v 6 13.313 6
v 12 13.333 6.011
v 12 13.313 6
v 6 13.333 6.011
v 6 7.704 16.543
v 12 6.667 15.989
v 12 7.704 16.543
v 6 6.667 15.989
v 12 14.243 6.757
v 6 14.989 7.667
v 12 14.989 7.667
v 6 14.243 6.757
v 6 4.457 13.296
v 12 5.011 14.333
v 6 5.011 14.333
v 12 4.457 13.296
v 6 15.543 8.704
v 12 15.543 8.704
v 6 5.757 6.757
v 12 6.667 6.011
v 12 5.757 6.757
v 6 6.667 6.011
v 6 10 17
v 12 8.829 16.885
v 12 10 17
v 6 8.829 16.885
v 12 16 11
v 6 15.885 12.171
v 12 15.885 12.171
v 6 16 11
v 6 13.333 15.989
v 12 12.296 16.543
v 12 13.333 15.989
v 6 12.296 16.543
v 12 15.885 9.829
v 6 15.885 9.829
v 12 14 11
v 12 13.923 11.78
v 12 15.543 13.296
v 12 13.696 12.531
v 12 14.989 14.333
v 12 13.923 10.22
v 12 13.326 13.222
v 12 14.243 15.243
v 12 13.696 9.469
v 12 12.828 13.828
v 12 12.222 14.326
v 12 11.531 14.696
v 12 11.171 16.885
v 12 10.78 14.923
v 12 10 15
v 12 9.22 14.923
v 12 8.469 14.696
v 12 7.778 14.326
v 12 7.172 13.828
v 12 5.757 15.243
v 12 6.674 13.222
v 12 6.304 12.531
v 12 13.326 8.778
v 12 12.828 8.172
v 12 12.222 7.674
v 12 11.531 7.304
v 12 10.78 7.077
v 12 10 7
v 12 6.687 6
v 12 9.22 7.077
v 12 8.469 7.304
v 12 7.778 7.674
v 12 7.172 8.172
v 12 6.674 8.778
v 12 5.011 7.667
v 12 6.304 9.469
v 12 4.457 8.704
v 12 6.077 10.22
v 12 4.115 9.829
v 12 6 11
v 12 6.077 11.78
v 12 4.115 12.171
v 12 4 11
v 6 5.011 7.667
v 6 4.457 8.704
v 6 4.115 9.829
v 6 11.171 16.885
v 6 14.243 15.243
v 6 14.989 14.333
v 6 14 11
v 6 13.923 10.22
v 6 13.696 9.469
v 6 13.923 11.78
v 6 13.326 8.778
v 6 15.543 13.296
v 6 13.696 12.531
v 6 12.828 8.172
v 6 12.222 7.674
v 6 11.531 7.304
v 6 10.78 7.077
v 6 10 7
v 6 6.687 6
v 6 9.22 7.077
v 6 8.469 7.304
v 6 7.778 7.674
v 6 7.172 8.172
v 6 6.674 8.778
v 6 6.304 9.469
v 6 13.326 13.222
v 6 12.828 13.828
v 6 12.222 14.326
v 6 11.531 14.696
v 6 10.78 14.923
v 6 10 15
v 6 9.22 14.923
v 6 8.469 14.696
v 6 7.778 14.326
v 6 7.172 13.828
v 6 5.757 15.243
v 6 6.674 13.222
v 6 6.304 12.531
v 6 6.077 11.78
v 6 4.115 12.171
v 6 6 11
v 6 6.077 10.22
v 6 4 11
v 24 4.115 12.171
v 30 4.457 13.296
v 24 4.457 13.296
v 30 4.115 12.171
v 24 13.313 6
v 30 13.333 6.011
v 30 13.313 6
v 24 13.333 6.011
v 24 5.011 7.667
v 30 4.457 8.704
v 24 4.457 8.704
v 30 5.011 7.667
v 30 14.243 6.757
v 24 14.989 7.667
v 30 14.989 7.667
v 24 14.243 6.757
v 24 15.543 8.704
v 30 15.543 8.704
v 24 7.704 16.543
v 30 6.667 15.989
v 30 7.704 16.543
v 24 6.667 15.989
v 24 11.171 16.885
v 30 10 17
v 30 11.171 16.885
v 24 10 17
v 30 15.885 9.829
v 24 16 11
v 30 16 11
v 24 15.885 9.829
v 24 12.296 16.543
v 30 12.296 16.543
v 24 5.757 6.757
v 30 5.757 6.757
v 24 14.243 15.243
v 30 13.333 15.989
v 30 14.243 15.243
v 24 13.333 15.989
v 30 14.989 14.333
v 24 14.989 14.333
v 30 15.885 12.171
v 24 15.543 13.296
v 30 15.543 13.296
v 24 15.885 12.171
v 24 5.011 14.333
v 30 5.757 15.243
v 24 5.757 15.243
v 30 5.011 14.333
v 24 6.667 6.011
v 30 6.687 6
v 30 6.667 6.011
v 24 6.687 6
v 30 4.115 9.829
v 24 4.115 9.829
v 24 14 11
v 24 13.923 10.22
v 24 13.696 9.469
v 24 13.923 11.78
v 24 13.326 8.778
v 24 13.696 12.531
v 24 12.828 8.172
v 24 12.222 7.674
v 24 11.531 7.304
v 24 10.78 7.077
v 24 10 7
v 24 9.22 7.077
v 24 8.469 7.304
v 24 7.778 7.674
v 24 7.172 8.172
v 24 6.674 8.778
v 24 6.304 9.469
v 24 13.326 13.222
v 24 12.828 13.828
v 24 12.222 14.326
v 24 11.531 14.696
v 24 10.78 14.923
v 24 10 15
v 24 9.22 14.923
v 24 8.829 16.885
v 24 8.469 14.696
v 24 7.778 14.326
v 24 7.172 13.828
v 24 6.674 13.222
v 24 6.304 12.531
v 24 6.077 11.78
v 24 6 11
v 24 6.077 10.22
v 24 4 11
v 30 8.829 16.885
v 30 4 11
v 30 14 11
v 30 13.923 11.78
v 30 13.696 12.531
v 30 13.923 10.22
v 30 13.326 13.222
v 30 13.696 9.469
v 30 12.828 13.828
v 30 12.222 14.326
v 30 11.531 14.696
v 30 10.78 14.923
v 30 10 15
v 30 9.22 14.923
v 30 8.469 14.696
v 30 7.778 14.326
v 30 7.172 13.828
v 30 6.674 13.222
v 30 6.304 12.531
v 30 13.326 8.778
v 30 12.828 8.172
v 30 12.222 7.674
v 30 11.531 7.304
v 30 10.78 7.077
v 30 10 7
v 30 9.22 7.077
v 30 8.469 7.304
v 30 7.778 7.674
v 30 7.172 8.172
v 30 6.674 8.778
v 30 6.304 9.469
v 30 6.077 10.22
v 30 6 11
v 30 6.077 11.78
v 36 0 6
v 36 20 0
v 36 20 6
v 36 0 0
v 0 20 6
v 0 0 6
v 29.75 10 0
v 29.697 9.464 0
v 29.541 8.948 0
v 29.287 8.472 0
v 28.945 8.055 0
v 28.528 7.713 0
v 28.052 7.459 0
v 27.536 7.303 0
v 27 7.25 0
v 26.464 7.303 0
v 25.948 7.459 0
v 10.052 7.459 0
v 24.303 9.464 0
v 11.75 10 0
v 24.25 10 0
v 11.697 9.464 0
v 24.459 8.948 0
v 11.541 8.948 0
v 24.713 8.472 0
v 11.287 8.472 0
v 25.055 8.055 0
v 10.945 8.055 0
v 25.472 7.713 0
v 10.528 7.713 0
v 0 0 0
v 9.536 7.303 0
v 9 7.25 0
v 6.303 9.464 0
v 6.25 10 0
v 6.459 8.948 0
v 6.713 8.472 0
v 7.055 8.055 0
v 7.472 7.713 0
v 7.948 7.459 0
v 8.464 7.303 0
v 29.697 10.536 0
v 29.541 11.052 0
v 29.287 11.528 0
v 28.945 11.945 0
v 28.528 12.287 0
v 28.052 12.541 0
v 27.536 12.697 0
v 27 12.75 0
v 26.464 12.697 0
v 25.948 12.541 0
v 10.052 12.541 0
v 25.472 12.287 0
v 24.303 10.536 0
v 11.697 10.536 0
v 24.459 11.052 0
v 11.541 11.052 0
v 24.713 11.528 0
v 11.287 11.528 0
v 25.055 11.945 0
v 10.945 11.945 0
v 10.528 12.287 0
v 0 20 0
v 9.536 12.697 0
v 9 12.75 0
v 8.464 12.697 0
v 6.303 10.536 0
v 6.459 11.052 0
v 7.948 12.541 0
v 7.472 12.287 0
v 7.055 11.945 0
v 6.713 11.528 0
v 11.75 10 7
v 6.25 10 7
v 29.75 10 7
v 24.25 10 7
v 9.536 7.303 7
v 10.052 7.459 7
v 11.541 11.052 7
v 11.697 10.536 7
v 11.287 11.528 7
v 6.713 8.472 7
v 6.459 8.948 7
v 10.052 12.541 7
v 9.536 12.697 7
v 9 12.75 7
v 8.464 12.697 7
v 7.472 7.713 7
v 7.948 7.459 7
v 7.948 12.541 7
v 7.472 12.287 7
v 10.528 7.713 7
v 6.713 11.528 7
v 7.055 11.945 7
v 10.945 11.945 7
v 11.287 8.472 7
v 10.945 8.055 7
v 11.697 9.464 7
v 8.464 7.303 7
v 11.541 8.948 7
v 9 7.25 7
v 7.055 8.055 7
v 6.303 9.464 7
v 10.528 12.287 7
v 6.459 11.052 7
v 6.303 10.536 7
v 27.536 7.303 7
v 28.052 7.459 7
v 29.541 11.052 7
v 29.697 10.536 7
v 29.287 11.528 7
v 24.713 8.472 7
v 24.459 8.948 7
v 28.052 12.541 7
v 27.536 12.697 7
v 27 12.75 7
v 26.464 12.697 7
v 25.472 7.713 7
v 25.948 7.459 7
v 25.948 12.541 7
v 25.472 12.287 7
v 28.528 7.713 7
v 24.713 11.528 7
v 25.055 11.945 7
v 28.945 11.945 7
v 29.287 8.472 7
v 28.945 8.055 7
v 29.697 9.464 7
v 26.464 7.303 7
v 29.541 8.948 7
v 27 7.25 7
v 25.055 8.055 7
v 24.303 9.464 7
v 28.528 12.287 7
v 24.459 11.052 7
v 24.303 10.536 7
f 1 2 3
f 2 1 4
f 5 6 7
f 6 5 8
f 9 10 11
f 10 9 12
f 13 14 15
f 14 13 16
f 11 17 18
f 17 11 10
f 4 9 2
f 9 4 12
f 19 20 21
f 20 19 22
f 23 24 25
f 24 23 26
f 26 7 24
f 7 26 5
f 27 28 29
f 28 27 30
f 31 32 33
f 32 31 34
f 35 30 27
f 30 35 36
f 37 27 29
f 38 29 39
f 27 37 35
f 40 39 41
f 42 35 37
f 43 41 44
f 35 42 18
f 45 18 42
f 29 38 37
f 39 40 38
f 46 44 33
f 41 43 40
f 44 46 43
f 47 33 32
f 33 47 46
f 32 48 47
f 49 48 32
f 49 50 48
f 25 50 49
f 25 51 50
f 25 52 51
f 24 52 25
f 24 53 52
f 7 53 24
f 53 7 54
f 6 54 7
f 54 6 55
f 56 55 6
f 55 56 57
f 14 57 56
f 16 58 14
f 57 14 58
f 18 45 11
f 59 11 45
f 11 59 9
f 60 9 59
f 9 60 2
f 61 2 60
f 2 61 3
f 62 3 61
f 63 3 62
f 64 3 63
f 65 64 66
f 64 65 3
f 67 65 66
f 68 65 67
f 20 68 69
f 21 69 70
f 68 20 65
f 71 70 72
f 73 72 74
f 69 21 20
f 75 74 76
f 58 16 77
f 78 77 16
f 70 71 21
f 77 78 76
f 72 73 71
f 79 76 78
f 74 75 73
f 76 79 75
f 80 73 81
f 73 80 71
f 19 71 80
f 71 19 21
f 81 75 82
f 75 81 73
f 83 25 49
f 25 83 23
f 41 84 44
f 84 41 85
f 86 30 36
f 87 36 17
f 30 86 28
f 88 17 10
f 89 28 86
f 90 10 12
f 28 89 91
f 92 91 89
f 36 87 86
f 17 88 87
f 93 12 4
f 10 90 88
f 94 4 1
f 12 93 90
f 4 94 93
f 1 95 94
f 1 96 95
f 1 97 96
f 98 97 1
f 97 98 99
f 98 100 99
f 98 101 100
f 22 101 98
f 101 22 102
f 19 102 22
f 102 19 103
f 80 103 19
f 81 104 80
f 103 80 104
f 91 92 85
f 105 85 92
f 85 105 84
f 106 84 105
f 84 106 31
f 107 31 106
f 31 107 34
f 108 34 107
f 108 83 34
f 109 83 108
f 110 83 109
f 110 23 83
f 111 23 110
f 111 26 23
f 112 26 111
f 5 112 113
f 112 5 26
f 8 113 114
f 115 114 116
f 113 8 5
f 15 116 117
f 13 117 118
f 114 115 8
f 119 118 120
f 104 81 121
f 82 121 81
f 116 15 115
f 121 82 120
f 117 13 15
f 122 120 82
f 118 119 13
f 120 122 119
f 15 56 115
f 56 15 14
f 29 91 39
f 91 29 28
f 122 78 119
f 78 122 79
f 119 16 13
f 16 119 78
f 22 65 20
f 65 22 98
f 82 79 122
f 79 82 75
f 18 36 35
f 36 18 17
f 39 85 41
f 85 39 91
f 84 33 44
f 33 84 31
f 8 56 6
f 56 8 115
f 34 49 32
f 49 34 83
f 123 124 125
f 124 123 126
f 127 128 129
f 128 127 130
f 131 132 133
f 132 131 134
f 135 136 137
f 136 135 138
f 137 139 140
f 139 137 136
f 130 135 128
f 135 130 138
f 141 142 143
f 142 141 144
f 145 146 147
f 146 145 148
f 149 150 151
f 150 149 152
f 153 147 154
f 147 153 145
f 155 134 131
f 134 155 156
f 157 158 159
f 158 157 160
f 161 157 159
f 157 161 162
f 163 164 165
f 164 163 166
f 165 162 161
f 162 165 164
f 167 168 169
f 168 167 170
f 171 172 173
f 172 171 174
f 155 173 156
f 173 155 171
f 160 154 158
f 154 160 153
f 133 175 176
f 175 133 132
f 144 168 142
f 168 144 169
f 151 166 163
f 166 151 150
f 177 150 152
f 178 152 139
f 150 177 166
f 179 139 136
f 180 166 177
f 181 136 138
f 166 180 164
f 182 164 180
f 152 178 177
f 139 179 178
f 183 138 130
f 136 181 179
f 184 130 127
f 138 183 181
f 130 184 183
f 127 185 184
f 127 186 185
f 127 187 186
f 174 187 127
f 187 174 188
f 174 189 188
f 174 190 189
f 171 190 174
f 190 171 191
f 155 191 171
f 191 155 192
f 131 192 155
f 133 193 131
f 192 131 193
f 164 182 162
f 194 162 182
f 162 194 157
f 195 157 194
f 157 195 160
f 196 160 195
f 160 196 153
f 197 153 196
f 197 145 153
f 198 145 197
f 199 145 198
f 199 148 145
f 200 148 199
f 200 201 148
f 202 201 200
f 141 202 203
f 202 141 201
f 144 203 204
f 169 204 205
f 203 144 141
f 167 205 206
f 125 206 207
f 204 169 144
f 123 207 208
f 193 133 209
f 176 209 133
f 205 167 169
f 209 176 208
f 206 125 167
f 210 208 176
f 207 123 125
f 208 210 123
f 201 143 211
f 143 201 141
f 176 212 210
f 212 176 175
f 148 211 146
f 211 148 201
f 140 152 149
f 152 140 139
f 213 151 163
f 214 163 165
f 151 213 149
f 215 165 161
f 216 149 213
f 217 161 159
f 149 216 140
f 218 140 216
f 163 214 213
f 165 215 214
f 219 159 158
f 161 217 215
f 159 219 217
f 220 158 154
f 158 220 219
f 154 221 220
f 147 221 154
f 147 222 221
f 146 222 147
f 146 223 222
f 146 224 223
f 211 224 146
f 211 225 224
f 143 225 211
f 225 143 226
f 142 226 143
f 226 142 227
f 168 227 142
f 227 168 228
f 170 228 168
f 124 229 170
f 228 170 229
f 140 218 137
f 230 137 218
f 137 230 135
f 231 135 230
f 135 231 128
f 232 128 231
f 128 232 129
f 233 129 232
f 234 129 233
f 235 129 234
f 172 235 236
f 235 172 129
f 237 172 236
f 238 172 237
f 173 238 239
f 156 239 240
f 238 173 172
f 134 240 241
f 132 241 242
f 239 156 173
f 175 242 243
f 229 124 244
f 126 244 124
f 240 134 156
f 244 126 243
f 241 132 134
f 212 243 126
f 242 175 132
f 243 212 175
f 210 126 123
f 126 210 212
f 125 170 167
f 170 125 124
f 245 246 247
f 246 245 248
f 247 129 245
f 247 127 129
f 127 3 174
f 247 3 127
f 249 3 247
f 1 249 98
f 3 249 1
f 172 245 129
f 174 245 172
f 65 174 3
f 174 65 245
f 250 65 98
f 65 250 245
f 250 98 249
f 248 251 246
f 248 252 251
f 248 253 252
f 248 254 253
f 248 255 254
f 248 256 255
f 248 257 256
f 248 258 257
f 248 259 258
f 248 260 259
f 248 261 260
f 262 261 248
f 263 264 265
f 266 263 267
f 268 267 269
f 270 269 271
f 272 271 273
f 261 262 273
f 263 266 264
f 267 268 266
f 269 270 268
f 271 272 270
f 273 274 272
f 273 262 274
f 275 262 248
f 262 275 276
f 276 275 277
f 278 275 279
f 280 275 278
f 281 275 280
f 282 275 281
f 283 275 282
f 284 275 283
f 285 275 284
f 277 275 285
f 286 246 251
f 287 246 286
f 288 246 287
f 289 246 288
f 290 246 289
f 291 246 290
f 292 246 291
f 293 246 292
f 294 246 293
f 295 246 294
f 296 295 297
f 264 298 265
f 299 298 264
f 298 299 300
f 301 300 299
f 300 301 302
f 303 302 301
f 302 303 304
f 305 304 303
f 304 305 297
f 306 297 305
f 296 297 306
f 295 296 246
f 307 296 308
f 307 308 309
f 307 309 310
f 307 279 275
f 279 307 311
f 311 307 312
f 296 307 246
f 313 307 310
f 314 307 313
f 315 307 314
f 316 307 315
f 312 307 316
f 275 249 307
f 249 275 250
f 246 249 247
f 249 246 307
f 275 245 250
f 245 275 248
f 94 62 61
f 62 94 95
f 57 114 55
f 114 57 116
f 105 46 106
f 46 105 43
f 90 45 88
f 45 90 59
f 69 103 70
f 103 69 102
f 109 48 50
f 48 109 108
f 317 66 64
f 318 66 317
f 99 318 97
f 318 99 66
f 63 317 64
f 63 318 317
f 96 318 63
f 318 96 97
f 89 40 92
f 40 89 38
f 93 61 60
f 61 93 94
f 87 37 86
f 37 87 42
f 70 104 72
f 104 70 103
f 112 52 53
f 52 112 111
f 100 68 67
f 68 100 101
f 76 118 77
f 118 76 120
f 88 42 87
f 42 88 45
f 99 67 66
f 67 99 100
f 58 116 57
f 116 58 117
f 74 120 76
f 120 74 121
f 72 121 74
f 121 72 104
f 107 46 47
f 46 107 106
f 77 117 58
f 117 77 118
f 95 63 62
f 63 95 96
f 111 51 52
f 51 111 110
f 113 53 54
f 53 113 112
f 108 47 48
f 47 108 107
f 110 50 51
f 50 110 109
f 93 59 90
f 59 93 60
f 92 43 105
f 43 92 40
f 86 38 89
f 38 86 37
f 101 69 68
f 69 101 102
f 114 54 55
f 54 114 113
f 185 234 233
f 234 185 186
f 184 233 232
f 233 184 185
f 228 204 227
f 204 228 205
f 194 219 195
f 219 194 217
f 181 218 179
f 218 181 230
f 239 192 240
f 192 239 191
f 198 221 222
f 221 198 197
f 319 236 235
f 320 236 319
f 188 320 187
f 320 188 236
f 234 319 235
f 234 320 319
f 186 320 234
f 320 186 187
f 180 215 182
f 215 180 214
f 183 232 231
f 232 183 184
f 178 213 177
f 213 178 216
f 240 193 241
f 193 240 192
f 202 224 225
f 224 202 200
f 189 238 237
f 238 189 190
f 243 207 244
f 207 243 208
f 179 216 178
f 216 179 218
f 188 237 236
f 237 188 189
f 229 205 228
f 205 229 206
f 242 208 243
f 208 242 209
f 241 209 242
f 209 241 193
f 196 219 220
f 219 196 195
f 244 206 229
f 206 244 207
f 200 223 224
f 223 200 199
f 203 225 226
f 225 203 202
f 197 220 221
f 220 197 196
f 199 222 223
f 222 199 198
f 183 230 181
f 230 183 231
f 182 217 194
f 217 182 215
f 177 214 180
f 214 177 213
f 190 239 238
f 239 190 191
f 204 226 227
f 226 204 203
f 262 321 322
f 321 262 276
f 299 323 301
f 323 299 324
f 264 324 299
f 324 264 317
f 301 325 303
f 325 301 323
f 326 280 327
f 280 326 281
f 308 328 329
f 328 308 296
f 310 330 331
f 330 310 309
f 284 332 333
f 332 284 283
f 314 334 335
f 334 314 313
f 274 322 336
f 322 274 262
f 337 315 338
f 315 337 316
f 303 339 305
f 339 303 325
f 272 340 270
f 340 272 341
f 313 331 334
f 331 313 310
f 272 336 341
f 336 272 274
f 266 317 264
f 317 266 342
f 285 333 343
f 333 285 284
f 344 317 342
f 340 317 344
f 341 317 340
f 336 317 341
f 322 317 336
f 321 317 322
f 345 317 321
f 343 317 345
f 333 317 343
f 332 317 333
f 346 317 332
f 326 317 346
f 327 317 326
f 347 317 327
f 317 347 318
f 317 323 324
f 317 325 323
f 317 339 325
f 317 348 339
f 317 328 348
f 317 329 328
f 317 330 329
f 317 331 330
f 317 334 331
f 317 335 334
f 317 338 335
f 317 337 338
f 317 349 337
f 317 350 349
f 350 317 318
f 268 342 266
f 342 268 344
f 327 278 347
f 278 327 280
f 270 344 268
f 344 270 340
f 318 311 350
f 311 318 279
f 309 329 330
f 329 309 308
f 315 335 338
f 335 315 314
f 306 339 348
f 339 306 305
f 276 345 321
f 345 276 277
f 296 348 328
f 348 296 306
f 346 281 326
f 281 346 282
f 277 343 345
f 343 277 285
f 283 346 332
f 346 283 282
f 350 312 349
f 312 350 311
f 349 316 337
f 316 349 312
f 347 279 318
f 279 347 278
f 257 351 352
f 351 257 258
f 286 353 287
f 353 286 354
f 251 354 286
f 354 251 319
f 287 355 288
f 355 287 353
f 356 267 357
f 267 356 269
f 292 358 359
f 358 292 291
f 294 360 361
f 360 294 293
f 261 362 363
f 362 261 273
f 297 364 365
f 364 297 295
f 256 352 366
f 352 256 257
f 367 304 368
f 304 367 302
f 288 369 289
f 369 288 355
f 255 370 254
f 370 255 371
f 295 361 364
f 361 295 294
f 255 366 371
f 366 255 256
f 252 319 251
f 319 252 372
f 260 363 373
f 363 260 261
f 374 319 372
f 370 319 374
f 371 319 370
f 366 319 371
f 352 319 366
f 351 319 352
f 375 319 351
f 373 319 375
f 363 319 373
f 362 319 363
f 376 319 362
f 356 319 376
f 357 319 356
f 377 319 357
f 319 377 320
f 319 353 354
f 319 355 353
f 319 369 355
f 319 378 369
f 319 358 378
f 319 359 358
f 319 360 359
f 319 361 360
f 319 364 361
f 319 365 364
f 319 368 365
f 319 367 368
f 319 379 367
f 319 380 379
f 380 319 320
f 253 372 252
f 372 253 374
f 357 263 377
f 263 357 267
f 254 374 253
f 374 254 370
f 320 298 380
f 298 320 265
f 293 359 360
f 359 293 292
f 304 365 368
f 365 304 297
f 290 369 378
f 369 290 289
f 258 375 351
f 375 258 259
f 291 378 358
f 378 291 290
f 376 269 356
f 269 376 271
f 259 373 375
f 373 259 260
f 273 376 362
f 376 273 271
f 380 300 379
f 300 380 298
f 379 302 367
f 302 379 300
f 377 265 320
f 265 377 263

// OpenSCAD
$fn = 32;

// ----------------------------------------------------------------------
// Cable clip: cable 8 mm, clamp 12 mm, base 36 mm
// ----------------------------------------------------------------------

// --- parameters (mm) ---
plate_x = 36;             // base length, X
plate_y = 20;             // base width, Y
plate_t = 6;              // base thickness
wire_seat_d = 12;         // clamp outside diameter
clip_t = 2;               // clamp wall
cable_d = 8;              // cable opening
ring_w = 6;               // clamp width along the cable
screw_d = 5.5;            // screw clearance
sink = 1;                 // overlap of the clamp into the base
pitch = 18;               // distance between the two clamps

module base() {
  cube([plate_x, plate_y, plate_t]);
}

module clamps() {
  for (sx = [-1, 1])
    translate([plate_x / 2 + sx * pitch / 2, plate_y / 2, plate_t + wire_seat_d / 2 - sink]) rotate([0, 90, 0])
      cylinder(h = ring_w, d = wire_seat_d, center = true);
}

difference() {
  union() {
    base();
    clamps();
  }
  for (sx = [-1, 1])
    translate([plate_x / 2 + sx * pitch / 2, plate_y / 2, plate_t + wire_seat_d / 2 - sink]) rotate([0, 90, 0]) translate([0, 0, -ring_w / 2 - 1]) cylinder(h = ring_w + 2, d = cable_d);
  translate([9, plate_y / 2, -1]) cylinder(h = plate_t + 2, d = screw_d);
  translate([27, plate_y / 2, -1]) cylinder(h = plate_t + 2, d = screw_d);
}
